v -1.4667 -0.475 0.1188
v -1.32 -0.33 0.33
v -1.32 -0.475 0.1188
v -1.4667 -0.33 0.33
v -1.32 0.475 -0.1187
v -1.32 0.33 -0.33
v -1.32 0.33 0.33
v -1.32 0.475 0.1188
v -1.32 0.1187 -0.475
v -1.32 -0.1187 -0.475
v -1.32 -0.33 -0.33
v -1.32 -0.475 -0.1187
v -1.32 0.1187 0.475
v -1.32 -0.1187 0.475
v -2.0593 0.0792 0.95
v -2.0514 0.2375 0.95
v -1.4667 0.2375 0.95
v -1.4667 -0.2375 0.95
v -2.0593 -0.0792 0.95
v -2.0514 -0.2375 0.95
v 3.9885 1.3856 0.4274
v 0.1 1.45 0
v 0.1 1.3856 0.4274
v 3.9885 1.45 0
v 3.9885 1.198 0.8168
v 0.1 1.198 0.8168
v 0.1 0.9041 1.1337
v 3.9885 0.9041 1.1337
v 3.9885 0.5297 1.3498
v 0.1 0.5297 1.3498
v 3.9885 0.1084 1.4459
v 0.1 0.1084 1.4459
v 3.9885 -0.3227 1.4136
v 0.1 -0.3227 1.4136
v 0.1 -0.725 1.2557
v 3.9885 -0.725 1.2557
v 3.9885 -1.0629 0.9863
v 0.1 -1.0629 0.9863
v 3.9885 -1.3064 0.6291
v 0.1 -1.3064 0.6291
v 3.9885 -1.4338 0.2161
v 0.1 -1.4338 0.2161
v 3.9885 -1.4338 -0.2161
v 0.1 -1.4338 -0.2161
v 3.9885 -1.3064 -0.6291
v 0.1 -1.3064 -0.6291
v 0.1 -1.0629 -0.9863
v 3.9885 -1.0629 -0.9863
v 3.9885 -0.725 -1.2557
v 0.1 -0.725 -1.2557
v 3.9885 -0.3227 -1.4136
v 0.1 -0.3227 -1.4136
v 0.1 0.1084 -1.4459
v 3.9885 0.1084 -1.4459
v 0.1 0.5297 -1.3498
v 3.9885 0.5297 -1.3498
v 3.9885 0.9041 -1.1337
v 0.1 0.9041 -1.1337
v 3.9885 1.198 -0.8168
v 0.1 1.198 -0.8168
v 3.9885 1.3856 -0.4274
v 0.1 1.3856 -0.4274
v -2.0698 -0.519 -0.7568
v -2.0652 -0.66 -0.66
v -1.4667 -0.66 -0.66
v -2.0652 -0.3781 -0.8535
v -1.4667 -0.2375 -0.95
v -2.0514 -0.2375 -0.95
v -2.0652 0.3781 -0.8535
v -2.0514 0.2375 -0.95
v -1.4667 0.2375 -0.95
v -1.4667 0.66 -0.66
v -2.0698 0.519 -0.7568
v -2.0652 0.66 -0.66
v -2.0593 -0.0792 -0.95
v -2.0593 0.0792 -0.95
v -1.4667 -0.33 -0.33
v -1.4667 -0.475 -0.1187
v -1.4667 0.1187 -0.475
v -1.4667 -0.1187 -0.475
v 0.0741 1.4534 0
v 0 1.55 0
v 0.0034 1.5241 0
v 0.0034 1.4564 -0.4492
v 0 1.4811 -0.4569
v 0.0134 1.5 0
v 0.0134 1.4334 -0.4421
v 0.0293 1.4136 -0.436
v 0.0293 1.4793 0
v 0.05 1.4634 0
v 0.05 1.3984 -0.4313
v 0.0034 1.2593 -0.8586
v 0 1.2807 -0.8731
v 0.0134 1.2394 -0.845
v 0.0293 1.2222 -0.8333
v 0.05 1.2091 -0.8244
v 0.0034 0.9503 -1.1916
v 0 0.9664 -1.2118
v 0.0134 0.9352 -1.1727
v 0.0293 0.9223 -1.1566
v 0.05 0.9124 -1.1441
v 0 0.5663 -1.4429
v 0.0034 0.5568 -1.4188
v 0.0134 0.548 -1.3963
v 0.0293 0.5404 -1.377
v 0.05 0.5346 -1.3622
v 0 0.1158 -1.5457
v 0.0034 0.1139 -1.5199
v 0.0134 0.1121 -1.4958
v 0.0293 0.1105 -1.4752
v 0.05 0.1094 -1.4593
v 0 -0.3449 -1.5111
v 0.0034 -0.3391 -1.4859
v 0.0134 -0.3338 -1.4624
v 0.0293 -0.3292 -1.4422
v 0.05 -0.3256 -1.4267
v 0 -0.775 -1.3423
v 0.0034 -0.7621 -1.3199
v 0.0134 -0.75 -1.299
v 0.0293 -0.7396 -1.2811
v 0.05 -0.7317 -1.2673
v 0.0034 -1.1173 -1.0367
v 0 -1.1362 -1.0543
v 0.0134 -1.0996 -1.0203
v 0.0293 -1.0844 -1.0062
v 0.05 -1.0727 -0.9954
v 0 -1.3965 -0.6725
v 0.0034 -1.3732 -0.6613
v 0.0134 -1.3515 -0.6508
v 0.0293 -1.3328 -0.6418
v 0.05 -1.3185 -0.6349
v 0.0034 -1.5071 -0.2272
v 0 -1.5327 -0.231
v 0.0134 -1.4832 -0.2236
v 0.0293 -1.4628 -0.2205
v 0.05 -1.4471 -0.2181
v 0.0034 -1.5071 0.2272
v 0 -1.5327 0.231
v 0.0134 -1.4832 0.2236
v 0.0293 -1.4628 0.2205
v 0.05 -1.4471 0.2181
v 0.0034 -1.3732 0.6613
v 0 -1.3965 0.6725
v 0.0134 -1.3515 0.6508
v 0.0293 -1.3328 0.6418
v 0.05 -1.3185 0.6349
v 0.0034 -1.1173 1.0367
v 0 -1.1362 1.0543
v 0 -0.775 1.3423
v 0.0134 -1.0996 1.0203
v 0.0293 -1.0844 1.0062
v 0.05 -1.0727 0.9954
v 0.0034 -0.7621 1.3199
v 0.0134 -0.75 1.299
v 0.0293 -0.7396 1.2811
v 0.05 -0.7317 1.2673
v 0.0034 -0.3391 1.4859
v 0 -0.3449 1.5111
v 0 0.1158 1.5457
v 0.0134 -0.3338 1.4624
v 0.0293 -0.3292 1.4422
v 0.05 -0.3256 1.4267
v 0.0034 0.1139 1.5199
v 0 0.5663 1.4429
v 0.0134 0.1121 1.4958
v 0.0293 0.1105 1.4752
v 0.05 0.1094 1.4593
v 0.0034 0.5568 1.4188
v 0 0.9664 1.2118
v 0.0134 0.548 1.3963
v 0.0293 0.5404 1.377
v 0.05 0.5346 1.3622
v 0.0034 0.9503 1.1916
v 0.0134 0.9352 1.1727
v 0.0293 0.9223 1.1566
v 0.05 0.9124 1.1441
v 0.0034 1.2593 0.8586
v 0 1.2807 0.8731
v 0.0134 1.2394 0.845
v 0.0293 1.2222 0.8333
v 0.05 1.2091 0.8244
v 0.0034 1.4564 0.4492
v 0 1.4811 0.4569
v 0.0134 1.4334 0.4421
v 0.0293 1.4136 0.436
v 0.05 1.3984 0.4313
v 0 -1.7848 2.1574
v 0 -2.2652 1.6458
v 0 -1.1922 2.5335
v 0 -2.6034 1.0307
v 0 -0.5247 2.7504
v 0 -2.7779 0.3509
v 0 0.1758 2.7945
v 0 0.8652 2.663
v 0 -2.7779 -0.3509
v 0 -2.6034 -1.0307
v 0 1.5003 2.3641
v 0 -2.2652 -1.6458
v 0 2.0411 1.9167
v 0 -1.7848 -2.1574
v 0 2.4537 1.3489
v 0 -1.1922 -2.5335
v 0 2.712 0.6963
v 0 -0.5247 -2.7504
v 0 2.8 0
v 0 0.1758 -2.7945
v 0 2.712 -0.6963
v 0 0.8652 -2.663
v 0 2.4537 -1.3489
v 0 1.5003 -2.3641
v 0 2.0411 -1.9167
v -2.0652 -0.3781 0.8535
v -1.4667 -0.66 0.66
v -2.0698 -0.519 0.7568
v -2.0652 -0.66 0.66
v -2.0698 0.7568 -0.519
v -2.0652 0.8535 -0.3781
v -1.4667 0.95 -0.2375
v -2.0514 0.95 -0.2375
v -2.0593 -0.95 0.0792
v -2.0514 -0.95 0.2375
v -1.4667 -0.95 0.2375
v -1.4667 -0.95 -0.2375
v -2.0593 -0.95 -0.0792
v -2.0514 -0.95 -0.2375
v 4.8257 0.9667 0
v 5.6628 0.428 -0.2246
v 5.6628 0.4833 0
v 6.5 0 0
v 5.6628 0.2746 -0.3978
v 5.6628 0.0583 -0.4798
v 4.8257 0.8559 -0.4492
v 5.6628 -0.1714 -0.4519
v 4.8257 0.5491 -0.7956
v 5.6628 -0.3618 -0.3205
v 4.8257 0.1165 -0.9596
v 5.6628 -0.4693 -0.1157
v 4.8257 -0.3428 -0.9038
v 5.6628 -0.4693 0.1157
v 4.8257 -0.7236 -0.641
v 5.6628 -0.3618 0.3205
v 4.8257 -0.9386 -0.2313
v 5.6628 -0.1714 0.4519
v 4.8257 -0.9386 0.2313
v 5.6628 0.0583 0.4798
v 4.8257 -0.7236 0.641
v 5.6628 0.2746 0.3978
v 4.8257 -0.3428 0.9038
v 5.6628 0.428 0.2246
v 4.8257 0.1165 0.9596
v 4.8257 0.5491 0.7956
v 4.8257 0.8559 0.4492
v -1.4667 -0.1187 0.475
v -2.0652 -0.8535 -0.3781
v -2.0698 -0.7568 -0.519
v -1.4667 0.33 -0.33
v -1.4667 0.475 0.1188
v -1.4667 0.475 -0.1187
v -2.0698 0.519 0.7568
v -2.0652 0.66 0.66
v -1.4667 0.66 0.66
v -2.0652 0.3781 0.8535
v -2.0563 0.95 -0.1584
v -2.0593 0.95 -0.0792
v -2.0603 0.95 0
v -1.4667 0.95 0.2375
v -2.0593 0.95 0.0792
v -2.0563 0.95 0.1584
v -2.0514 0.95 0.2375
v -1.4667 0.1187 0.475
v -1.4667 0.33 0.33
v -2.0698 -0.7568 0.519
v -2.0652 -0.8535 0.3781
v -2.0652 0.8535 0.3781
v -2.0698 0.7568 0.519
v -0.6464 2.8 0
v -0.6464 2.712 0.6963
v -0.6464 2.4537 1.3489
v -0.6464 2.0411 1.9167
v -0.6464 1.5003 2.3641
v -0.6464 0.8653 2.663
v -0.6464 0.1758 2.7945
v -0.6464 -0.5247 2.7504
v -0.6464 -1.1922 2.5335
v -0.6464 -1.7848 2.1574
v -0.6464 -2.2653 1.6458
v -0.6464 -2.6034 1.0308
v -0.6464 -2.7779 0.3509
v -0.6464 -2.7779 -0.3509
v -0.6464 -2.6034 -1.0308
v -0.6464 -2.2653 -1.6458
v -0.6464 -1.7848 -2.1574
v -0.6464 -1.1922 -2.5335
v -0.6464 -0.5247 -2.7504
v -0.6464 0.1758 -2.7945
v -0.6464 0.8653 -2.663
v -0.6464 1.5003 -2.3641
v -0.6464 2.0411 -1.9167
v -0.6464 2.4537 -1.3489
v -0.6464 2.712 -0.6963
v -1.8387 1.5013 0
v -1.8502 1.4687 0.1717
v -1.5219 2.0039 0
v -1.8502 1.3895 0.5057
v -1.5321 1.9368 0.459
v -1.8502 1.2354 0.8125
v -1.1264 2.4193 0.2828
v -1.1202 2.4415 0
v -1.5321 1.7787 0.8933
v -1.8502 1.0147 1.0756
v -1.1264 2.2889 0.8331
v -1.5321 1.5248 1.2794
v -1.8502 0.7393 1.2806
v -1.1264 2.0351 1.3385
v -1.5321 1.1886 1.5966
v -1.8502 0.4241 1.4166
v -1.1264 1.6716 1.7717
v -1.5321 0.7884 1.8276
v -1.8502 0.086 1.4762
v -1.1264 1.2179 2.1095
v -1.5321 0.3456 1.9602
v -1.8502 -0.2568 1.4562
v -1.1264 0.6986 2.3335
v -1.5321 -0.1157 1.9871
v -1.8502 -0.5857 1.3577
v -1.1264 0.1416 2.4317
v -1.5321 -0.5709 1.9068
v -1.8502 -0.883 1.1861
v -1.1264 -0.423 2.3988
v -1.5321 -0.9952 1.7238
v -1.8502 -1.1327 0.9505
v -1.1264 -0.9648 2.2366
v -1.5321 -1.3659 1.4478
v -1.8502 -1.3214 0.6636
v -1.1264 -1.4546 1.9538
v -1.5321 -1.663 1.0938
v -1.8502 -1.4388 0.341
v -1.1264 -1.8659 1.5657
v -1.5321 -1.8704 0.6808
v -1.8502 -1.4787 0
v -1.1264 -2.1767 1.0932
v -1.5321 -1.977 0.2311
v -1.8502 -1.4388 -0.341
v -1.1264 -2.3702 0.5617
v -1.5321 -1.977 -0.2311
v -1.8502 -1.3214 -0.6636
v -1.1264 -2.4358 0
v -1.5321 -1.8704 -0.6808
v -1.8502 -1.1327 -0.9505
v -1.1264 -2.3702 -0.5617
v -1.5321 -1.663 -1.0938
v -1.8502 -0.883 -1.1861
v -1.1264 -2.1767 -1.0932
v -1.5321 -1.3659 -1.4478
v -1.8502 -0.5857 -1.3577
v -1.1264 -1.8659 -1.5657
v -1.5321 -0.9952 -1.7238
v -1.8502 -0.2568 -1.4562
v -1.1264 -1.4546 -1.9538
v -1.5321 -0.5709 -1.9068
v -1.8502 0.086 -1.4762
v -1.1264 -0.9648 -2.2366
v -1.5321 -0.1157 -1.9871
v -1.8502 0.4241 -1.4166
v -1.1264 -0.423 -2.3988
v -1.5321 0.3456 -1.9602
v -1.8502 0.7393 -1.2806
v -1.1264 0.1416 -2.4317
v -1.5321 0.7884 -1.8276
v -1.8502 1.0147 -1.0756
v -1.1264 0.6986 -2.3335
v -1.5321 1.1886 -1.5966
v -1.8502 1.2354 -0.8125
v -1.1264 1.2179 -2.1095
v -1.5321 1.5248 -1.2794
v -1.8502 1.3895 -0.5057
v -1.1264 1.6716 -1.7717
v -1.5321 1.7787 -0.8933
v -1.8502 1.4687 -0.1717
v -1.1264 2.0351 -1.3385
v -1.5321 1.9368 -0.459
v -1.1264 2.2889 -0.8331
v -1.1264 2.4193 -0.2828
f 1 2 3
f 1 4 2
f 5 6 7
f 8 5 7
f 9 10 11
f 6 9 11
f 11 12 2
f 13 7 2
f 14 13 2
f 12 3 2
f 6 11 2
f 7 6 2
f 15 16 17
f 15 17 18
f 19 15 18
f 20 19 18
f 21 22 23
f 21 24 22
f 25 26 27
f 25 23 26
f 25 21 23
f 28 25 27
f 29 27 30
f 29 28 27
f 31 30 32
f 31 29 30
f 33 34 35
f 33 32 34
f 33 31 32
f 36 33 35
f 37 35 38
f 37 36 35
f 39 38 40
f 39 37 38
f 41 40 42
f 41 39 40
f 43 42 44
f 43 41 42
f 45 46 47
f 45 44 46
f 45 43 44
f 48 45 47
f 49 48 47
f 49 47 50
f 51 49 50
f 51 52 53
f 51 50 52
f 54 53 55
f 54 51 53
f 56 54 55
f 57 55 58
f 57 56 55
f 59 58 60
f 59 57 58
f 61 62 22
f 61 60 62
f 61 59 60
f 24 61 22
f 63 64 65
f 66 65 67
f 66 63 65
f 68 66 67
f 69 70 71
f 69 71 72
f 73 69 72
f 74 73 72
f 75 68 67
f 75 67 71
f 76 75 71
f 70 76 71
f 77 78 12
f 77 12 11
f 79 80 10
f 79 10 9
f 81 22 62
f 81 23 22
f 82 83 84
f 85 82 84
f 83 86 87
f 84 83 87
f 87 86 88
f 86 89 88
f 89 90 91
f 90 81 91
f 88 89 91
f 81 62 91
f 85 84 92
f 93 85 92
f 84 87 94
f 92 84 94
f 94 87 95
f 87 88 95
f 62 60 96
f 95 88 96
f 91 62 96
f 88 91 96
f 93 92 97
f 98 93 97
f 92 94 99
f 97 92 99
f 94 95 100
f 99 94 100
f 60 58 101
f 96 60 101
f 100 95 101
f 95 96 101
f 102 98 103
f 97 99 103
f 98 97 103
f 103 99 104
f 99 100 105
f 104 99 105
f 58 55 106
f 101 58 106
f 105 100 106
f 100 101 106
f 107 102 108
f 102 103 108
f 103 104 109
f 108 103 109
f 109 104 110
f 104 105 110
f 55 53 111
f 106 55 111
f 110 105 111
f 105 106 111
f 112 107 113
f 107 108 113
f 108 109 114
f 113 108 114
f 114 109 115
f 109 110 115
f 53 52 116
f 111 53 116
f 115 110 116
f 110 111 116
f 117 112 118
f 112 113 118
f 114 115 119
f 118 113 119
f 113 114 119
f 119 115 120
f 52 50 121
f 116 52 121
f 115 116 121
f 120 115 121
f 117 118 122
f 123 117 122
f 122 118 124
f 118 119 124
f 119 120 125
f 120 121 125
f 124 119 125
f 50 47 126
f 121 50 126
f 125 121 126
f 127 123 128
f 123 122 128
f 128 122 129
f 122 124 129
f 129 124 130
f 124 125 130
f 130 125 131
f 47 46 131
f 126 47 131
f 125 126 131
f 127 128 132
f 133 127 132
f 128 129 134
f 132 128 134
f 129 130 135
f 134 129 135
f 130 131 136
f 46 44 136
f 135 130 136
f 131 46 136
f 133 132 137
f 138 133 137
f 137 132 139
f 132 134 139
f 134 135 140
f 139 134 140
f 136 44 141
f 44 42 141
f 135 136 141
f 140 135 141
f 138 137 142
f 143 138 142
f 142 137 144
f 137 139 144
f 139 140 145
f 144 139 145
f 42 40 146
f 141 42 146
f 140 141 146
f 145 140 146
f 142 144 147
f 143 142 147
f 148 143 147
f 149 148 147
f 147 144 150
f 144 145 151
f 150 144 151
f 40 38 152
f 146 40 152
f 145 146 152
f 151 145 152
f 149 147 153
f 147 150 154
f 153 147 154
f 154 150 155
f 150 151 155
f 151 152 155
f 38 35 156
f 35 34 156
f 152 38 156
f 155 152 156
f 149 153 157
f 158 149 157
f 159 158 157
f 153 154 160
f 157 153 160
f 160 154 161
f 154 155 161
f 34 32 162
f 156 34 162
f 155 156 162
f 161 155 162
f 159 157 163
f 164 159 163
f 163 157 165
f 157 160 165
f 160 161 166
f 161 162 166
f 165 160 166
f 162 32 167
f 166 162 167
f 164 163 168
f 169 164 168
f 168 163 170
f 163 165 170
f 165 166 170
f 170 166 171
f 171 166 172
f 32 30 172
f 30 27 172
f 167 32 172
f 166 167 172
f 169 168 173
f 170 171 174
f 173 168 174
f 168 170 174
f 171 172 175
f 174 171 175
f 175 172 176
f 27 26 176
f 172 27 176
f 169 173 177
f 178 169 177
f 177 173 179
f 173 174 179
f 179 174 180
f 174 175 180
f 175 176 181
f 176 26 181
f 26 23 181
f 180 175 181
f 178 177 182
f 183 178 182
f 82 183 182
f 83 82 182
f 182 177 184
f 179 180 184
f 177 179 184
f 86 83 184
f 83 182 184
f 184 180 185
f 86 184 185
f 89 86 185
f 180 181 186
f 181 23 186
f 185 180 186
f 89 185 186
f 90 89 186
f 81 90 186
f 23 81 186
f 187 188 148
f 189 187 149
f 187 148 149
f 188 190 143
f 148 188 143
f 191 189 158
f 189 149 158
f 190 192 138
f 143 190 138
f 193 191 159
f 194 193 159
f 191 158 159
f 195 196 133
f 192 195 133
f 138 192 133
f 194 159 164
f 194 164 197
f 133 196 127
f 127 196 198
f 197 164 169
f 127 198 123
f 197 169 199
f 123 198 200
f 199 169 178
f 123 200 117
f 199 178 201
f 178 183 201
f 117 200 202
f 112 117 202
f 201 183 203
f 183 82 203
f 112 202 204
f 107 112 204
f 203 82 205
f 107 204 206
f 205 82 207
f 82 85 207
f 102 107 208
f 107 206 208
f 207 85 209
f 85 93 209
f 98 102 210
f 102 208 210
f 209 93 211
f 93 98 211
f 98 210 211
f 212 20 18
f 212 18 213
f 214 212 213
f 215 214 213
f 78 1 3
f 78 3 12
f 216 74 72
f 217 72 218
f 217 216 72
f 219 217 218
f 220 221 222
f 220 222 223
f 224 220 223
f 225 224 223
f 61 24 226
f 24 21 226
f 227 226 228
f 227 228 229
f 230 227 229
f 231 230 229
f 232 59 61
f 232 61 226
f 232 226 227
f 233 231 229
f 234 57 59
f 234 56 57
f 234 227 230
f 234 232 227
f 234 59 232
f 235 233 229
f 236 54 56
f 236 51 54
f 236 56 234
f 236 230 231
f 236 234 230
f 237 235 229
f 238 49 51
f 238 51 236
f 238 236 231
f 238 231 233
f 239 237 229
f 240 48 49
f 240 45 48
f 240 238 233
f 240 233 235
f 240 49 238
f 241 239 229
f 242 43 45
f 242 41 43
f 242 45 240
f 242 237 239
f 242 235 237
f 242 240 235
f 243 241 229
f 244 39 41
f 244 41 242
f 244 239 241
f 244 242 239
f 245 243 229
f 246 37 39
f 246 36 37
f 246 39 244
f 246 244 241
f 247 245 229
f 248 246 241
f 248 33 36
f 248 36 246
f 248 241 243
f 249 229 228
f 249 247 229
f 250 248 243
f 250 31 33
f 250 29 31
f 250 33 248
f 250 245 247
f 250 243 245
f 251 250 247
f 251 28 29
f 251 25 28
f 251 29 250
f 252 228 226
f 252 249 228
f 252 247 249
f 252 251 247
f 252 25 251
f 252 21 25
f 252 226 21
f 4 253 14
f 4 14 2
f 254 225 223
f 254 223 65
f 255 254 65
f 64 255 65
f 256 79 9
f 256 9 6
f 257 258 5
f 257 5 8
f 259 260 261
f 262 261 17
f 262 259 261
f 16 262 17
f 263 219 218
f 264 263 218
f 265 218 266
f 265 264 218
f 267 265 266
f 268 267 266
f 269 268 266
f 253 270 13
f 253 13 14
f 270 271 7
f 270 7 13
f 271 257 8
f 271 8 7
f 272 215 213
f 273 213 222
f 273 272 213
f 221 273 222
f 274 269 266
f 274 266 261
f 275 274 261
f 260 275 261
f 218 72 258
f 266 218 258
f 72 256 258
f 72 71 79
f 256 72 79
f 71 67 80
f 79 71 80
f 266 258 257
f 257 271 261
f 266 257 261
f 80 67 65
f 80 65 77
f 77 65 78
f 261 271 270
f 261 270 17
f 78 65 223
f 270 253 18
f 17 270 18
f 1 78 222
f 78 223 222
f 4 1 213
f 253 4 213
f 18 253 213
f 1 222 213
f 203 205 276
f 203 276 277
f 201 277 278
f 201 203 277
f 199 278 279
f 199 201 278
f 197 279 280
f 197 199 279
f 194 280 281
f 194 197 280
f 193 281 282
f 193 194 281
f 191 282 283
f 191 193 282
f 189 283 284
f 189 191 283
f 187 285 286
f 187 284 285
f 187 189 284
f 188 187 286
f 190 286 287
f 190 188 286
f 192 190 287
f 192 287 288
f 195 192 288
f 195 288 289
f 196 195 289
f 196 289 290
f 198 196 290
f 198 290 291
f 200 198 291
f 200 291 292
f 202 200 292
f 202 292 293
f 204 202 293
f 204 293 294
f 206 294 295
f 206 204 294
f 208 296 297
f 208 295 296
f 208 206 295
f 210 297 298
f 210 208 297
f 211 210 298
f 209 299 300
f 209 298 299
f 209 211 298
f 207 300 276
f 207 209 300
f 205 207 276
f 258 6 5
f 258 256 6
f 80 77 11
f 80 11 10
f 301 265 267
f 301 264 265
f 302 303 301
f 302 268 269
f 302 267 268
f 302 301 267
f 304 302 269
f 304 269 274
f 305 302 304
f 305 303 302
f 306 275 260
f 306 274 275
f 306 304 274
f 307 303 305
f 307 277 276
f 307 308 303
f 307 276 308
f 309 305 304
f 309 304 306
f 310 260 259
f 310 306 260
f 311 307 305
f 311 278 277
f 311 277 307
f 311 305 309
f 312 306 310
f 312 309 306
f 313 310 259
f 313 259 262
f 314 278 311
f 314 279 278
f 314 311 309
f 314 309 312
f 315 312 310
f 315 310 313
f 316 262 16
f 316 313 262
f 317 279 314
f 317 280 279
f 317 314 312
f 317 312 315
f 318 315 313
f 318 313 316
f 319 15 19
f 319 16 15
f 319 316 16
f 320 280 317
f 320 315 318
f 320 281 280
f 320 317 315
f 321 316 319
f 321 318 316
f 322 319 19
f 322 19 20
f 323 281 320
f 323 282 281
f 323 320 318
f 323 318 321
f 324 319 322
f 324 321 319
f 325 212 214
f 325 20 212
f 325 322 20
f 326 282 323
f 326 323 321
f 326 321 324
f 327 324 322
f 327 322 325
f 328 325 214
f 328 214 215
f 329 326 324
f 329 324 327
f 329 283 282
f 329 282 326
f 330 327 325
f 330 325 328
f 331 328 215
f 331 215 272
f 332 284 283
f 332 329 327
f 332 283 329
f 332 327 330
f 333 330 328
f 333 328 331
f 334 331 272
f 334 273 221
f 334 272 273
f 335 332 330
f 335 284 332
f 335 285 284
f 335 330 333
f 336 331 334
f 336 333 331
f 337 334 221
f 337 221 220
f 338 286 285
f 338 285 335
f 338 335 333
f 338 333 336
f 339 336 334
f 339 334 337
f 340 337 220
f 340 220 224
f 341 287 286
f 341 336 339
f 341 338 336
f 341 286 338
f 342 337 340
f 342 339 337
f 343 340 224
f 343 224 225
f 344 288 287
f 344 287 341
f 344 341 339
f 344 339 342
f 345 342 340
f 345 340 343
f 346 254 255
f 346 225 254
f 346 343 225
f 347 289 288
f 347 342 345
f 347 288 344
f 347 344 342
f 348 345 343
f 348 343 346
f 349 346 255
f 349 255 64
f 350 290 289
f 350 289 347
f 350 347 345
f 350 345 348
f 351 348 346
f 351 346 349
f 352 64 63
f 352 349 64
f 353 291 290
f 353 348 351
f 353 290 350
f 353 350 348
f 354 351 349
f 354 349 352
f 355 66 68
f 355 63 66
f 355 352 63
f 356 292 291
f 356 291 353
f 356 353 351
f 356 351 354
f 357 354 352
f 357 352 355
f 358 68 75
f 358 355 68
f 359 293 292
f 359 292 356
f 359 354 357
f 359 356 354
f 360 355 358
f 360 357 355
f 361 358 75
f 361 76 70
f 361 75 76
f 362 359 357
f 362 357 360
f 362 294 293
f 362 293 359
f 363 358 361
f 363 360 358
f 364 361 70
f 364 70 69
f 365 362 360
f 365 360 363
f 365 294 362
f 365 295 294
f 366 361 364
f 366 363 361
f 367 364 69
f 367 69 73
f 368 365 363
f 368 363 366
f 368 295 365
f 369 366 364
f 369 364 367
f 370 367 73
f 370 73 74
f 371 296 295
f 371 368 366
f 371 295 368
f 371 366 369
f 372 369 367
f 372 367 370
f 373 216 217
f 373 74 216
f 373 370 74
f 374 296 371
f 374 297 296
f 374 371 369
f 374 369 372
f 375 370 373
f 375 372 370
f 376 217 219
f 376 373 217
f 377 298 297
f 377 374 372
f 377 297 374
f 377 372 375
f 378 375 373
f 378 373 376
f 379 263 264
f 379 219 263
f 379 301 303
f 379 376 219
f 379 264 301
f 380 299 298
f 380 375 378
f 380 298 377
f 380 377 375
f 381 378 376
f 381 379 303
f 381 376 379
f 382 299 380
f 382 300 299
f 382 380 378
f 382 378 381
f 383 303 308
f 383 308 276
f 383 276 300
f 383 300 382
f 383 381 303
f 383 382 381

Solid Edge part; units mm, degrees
sketch "Sketch1" plane through (0, 0, 0) normal (0, 0, 1) x (1, 0, 0)
  arc A0 (-2.2, 0) -> (-0.6464, 2.8) centre (1.1, 0) cw
  line L0 (-0.6464, 2.8) -> (0, 2.8)
  line L1 (0, 2.8) -> (0, 1.55)
  arc A1 (0, 1.55) -> (0.1, 1.45) centre (0.1, 1.55) ccw
  line L2 (0.1, 1.45) -> (3.9885, 1.45)
  line L3 (3.9885, 1.45) -> (6.5, 0)
  line L4 (6.5, 0) -> (-2.2, 0)
revolve "RevolvedProtrusion1" add sketch "Sketch1" angle 360 about axis through (6.5, 0, 0) along (-1, 0, 0)
sketch "Sketch2" plane through (-2.2, 0, 0) normal (1, 0, 0) x (0, 1, 0)
  line L0 (0.2375, 0.95) -> (-0.2375, 0.95)
  line L1 (-0.2375, 0.95) -> (-0.66, 0.66)
  line L2 (-0.66, 0.66) -> (-0.95, 0.2375)
  line L3 (-0.95, 0.2375) -> (-0.95, -0.2375)
  line L4 (-0.95, -0.2375) -> (-0.66, -0.66)
  line L5 (-0.66, -0.66) -> (-0.2375, -0.95)
  line L6 (-0.2375, -0.95) -> (0.2375, -0.95)
  line L7 (0.2375, -0.95) -> (0.66, -0.66)
  line L8 (0.66, -0.66) -> (0.95, -0.2375)
  line L9 (0.95, -0.2375) -> (0.95, 0.2375)
  line L10 (0.95, 0.2375) -> (0.66, 0.66)
  line L11 (0.66, 0.66) -> (0.2375, 0.95)
extrude "ExtrudedCutout_1" cut sketch "Sketch2" along normal blind 0.7333
sketch "Sketch3" plane through (-2.2, 0, 0) normal (1, 0, 0) x (0, 1, 0)
  line L0 (0.1187, 0.475) -> (-0.1187, 0.475)
  line L1 (-0.1187, 0.475) -> (-0.33, 0.33)
  line L2 (-0.33, 0.33) -> (-0.475, 0.1188)
  line L3 (-0.475, 0.1188) -> (-0.475, -0.1187)
  line L4 (-0.475, -0.1187) -> (-0.33, -0.33)
  line L5 (-0.33, -0.33) -> (-0.1187, -0.475)
  line L6 (-0.1187, -0.475) -> (0.1187, -0.475)
  line L7 (0.1187, -0.475) -> (0.33, -0.33)
  line L8 (0.33, -0.33) -> (0.475, -0.1187)
  line L9 (0.475, -0.1187) -> (0.475, 0.1188)
  line L10 (0.475, 0.1188) -> (0.33, 0.33)
  line L11 (0.33, 0.33) -> (0.1187, 0.475)
extrude "ExtrudedCutout_2" cut sketch "Sketch3" along normal blind 0.88
properties part number "bene_inox_212406-2,9X6,5"
